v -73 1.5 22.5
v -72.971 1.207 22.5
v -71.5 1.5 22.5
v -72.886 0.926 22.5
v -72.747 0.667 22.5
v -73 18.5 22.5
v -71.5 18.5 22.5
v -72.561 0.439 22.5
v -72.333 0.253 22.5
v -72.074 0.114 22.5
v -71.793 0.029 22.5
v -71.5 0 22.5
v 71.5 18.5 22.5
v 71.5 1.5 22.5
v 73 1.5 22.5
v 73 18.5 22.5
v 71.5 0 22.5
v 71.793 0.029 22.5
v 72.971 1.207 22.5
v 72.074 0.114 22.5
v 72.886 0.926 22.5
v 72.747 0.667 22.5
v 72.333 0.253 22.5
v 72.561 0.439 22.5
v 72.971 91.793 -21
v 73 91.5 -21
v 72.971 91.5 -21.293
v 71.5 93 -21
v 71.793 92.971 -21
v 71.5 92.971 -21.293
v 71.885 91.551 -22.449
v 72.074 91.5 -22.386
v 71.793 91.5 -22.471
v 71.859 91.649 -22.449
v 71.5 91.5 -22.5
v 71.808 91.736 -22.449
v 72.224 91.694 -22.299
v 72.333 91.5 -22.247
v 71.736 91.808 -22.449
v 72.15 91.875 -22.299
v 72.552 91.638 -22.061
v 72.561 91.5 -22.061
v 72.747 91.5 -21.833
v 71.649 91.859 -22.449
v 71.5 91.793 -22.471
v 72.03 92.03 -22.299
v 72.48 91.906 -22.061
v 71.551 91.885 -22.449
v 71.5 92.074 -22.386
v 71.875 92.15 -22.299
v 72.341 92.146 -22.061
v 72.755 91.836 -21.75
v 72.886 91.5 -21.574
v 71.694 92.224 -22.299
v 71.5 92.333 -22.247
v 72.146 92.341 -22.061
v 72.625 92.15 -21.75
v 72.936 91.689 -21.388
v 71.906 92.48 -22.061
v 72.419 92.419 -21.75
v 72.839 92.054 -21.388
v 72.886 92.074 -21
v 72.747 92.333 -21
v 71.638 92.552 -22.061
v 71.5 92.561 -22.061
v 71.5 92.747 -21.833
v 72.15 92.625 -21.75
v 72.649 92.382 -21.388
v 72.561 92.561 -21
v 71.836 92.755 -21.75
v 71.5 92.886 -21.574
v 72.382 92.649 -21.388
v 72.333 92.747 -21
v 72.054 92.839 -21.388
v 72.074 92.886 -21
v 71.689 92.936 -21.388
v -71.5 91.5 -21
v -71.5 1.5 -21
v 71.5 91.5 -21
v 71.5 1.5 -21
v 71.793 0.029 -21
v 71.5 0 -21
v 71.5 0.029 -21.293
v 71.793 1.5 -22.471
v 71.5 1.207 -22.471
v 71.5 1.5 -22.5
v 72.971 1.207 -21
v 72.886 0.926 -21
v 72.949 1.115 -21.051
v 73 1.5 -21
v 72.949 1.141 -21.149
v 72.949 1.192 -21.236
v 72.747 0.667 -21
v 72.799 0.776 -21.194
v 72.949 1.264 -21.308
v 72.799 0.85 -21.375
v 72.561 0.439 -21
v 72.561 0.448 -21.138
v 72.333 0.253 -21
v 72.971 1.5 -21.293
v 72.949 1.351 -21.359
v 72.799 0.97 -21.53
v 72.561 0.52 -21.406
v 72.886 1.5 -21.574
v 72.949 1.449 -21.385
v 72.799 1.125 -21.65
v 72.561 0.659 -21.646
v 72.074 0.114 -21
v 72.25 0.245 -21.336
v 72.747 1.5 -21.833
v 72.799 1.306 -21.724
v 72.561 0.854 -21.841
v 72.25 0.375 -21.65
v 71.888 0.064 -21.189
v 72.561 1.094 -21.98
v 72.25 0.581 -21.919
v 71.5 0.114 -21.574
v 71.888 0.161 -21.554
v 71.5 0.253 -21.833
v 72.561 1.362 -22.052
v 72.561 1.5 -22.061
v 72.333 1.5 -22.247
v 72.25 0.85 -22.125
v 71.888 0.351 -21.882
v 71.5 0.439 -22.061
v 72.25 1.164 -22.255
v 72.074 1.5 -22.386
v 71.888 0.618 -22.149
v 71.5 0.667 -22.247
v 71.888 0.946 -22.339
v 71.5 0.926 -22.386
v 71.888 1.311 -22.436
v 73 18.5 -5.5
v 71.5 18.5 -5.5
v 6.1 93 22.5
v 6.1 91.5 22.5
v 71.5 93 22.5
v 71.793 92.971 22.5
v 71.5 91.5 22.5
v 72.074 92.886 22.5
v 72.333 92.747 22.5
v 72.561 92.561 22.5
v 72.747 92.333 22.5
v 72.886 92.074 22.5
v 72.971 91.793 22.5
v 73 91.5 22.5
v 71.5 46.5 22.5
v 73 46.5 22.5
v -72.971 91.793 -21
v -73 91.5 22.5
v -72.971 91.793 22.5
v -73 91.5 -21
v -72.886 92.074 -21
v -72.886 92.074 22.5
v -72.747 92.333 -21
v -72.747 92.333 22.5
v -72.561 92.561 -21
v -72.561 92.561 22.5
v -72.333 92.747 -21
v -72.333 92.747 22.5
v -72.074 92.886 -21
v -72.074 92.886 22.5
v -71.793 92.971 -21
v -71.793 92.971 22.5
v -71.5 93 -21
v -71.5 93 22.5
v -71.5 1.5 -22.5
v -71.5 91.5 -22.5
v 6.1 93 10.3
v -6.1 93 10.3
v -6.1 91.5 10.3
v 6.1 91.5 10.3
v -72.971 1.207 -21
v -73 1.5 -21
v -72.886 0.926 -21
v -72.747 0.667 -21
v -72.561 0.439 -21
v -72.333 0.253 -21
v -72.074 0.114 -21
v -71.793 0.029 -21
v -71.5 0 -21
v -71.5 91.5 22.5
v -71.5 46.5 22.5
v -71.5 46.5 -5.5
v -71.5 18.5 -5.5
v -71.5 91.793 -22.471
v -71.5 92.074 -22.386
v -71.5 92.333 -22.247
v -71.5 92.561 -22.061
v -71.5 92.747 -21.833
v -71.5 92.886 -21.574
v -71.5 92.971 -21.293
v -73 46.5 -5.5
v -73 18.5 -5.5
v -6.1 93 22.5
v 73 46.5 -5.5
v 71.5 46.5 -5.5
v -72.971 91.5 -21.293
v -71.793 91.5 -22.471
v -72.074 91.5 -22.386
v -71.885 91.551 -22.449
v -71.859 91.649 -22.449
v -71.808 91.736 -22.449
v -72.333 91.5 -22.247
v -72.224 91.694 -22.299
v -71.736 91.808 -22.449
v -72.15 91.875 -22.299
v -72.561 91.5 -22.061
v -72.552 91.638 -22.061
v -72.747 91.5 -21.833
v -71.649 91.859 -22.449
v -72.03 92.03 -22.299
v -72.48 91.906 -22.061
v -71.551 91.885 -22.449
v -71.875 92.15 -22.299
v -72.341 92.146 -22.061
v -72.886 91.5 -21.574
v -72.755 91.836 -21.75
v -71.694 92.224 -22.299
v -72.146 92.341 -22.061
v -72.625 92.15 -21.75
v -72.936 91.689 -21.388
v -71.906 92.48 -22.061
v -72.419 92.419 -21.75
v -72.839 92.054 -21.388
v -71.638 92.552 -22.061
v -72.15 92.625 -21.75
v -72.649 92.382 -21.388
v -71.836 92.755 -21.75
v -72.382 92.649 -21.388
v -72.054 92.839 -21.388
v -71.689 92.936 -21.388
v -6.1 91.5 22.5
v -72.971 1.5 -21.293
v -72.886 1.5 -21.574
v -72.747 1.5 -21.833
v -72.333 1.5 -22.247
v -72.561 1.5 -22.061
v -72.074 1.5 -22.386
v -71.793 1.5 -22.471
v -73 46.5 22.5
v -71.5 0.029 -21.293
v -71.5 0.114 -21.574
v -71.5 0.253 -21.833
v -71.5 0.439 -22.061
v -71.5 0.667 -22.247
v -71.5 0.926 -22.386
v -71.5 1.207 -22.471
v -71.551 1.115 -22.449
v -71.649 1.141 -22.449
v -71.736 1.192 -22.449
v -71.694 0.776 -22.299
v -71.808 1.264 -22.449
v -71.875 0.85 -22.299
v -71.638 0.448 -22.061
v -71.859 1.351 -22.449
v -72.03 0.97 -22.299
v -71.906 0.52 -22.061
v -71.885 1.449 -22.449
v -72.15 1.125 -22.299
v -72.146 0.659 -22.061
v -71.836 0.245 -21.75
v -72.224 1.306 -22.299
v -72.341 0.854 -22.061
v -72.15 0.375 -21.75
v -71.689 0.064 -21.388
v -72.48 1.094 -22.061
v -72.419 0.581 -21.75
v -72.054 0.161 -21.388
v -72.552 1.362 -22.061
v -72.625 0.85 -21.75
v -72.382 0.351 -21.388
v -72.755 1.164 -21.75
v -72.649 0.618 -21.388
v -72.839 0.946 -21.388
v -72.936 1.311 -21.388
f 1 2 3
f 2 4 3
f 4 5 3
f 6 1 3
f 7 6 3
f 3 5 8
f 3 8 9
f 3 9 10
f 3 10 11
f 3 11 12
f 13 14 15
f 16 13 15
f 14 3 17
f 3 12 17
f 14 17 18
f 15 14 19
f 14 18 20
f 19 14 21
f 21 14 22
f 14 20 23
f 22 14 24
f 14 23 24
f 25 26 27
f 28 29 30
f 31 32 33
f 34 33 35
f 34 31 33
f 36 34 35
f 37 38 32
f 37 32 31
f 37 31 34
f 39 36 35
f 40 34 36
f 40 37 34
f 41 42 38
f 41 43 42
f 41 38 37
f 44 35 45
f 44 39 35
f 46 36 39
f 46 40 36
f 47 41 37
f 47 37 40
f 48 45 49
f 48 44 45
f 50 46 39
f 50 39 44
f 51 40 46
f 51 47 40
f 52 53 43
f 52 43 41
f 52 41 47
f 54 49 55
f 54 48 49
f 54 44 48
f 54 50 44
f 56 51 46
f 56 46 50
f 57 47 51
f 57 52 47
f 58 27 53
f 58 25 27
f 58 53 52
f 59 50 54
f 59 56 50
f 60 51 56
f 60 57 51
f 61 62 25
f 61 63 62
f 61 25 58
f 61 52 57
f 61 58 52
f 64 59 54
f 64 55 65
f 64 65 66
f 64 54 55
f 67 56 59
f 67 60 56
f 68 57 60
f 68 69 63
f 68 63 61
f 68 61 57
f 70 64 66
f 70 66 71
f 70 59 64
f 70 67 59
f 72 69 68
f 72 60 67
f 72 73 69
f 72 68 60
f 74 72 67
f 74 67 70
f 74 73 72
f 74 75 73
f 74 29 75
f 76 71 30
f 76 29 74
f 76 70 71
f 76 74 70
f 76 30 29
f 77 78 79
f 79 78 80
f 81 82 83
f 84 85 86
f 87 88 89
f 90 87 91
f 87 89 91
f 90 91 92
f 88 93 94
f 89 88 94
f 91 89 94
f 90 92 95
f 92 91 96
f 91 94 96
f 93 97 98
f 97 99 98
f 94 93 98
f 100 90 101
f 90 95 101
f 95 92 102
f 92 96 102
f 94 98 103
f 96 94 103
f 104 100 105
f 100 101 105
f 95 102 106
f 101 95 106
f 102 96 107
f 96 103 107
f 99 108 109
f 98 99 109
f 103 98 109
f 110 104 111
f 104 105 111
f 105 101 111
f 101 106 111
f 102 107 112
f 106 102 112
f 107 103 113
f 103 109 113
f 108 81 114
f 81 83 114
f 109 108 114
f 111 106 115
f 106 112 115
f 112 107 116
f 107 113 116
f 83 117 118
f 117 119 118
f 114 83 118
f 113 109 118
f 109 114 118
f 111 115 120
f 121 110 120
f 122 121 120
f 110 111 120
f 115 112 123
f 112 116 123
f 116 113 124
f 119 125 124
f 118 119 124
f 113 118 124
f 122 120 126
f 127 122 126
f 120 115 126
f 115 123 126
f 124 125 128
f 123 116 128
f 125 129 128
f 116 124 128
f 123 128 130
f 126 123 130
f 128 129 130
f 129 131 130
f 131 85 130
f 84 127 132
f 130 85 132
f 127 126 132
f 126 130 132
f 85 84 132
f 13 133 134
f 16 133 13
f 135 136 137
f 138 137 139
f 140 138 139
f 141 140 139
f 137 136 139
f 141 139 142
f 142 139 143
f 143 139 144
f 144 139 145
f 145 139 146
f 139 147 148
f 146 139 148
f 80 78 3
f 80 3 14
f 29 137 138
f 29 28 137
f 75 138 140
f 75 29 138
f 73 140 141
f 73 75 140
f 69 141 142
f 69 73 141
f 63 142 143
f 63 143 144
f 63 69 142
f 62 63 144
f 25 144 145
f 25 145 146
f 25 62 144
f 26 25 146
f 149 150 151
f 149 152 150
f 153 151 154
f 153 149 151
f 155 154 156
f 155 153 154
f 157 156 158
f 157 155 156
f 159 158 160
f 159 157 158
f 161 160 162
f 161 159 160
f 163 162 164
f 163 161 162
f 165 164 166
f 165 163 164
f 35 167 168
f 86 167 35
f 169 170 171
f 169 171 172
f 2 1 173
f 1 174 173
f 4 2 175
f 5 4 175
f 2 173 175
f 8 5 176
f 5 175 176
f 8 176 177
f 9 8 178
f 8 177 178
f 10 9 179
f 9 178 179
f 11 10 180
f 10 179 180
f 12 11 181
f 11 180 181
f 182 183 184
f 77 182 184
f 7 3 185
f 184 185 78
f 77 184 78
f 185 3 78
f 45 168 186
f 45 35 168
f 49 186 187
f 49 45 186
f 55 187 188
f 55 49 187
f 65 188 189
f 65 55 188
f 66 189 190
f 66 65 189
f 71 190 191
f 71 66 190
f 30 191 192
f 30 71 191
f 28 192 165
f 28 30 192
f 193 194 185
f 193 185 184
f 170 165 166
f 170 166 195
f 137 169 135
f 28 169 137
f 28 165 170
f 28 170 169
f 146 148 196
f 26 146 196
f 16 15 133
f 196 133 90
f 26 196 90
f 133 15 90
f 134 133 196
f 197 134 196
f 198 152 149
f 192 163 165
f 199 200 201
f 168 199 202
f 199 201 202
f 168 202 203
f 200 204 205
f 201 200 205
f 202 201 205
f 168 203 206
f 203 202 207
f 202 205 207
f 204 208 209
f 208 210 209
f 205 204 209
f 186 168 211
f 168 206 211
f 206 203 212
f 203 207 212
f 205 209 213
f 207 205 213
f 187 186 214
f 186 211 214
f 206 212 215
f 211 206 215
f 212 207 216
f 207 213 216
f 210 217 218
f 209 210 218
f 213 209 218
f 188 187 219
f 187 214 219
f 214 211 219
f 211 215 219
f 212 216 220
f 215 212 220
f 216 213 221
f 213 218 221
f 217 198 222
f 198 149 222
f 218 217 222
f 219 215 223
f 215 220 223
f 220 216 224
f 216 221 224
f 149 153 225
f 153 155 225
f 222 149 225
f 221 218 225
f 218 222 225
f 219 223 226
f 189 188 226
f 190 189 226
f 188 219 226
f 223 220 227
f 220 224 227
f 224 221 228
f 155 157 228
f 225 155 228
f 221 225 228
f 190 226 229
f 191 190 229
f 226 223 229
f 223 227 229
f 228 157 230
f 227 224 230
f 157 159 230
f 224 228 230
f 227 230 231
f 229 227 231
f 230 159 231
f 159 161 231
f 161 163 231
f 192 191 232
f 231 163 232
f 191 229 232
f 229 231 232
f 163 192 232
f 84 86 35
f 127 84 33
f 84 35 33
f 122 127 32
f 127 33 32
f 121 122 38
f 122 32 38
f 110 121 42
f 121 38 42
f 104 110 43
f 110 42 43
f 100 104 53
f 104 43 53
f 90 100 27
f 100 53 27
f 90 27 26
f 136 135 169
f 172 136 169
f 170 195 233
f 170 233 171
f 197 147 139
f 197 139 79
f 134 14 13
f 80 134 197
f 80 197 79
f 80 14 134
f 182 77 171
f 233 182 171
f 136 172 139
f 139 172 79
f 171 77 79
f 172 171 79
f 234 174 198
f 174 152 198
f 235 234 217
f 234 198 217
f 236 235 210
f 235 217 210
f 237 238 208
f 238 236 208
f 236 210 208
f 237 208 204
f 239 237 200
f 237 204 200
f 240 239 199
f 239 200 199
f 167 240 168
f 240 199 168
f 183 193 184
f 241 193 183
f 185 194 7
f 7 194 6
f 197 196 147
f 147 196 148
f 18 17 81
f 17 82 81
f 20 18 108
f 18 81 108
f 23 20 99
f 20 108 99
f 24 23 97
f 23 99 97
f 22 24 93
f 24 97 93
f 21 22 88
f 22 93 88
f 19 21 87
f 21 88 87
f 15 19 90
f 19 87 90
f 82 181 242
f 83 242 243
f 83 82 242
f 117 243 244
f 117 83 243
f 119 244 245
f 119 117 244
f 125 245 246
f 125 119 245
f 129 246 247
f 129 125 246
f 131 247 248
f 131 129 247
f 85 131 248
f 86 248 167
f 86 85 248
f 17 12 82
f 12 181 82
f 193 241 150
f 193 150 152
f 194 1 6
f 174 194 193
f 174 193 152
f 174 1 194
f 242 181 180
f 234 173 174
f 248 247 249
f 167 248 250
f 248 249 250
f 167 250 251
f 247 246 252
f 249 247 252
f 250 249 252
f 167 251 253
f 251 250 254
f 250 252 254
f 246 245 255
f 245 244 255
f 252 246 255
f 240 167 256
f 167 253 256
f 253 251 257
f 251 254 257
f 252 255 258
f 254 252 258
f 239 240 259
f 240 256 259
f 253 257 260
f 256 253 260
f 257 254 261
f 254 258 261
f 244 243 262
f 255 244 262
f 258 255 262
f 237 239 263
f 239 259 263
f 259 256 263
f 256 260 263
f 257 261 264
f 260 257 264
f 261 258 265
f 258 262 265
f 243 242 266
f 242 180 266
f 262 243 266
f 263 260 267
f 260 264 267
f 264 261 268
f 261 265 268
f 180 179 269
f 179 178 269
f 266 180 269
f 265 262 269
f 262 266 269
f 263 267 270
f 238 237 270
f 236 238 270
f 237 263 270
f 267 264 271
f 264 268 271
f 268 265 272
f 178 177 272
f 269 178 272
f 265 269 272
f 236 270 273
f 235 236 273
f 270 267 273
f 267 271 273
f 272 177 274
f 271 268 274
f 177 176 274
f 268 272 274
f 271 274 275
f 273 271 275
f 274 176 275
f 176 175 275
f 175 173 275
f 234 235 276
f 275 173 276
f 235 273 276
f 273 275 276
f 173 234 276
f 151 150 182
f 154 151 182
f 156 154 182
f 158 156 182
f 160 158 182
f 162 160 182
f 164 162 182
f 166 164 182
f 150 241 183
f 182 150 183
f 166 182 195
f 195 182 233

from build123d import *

# Parameters (mm, degrees)
SKETCH_1_W          = 146
SKETCH_1_H          = 45
EXTRUDE_1_DEPTH     = 93
SHELL_1_T           = -1.5
SKETCH_2_W          = 28
SKETCH_2_H          = 28
CUT_EXTRUDE_1_DEPTH = 1.5
SKETCH_4_W          = 12.2
SKETCH_4_H          = 12.2
CUT_EXTRUDE_2_DEPTH = 1.5
FILLET_1_R          = 1.5


with BuildPart() as part:
    # 草图1 → 凸台-拉伸1 (new body)
    with BuildSketch(Plane(origin=(0, 0, 0), x_dir=(1, 0, 0), z_dir=(0, 1, 0))):
        Rectangle(SKETCH_1_W, SKETCH_1_H)
    extrude(amount=EXTRUDE_1_DEPTH)

    # 抽壳1
    shell_1_openings = [part.faces().sort_by_distance(p)[0] for p in [
        (0, 46.5, 22.5),
    ]]
    offset(amount=SHELL_1_T, openings=shell_1_openings, kind=Kind.INTERSECTION)

    # 草图2 → 切除-拉伸1 (cut)
    with BuildSketch(Plane.ZY.offset(73)):
        with Locations((8.5, 32.5)):
            Rectangle(SKETCH_2_W, SKETCH_2_H)
    cut_extrude_1 = extrude(amount=-CUT_EXTRUDE_1_DEPTH, mode=Mode.SUBTRACT)

    # 草图4 → 切除-拉伸2 (cut)
    with BuildSketch(Plane(origin=(0, 93, 0), x_dir=(1, 0, 0), z_dir=(0, 1, 0))):
        with Locations((0, -16.4)):
            Rectangle(SKETCH_4_W, SKETCH_4_H)
    extrude(amount=-CUT_EXTRUDE_2_DEPTH, mode=Mode.SUBTRACT)

    # 镜向1: 切除-拉伸1 across plane
    add(cut_extrude_1.mirror(Plane(origin=(0, 0, 0), x_dir=(0, 0, 1), z_dir=(1, 0, 0))), mode=Mode.SUBTRACT)

    # 圆角1
    fillet_1_edges = [part.edges().sort_by_distance(p)[0] for p in [
        (-73, 93, 0),
        (73, 93, 0),
        (-73, 0, 0),
        (0, 0, -22.5),
        (73, 0, 0),
        (-73, 46.5, -22.5),
        (73, 46.5, -22.5),
        (0, 93, -22.5),
    ]]
    fillet(fillet_1_edges, radius=FILLET_1_R)


solid = part.part
